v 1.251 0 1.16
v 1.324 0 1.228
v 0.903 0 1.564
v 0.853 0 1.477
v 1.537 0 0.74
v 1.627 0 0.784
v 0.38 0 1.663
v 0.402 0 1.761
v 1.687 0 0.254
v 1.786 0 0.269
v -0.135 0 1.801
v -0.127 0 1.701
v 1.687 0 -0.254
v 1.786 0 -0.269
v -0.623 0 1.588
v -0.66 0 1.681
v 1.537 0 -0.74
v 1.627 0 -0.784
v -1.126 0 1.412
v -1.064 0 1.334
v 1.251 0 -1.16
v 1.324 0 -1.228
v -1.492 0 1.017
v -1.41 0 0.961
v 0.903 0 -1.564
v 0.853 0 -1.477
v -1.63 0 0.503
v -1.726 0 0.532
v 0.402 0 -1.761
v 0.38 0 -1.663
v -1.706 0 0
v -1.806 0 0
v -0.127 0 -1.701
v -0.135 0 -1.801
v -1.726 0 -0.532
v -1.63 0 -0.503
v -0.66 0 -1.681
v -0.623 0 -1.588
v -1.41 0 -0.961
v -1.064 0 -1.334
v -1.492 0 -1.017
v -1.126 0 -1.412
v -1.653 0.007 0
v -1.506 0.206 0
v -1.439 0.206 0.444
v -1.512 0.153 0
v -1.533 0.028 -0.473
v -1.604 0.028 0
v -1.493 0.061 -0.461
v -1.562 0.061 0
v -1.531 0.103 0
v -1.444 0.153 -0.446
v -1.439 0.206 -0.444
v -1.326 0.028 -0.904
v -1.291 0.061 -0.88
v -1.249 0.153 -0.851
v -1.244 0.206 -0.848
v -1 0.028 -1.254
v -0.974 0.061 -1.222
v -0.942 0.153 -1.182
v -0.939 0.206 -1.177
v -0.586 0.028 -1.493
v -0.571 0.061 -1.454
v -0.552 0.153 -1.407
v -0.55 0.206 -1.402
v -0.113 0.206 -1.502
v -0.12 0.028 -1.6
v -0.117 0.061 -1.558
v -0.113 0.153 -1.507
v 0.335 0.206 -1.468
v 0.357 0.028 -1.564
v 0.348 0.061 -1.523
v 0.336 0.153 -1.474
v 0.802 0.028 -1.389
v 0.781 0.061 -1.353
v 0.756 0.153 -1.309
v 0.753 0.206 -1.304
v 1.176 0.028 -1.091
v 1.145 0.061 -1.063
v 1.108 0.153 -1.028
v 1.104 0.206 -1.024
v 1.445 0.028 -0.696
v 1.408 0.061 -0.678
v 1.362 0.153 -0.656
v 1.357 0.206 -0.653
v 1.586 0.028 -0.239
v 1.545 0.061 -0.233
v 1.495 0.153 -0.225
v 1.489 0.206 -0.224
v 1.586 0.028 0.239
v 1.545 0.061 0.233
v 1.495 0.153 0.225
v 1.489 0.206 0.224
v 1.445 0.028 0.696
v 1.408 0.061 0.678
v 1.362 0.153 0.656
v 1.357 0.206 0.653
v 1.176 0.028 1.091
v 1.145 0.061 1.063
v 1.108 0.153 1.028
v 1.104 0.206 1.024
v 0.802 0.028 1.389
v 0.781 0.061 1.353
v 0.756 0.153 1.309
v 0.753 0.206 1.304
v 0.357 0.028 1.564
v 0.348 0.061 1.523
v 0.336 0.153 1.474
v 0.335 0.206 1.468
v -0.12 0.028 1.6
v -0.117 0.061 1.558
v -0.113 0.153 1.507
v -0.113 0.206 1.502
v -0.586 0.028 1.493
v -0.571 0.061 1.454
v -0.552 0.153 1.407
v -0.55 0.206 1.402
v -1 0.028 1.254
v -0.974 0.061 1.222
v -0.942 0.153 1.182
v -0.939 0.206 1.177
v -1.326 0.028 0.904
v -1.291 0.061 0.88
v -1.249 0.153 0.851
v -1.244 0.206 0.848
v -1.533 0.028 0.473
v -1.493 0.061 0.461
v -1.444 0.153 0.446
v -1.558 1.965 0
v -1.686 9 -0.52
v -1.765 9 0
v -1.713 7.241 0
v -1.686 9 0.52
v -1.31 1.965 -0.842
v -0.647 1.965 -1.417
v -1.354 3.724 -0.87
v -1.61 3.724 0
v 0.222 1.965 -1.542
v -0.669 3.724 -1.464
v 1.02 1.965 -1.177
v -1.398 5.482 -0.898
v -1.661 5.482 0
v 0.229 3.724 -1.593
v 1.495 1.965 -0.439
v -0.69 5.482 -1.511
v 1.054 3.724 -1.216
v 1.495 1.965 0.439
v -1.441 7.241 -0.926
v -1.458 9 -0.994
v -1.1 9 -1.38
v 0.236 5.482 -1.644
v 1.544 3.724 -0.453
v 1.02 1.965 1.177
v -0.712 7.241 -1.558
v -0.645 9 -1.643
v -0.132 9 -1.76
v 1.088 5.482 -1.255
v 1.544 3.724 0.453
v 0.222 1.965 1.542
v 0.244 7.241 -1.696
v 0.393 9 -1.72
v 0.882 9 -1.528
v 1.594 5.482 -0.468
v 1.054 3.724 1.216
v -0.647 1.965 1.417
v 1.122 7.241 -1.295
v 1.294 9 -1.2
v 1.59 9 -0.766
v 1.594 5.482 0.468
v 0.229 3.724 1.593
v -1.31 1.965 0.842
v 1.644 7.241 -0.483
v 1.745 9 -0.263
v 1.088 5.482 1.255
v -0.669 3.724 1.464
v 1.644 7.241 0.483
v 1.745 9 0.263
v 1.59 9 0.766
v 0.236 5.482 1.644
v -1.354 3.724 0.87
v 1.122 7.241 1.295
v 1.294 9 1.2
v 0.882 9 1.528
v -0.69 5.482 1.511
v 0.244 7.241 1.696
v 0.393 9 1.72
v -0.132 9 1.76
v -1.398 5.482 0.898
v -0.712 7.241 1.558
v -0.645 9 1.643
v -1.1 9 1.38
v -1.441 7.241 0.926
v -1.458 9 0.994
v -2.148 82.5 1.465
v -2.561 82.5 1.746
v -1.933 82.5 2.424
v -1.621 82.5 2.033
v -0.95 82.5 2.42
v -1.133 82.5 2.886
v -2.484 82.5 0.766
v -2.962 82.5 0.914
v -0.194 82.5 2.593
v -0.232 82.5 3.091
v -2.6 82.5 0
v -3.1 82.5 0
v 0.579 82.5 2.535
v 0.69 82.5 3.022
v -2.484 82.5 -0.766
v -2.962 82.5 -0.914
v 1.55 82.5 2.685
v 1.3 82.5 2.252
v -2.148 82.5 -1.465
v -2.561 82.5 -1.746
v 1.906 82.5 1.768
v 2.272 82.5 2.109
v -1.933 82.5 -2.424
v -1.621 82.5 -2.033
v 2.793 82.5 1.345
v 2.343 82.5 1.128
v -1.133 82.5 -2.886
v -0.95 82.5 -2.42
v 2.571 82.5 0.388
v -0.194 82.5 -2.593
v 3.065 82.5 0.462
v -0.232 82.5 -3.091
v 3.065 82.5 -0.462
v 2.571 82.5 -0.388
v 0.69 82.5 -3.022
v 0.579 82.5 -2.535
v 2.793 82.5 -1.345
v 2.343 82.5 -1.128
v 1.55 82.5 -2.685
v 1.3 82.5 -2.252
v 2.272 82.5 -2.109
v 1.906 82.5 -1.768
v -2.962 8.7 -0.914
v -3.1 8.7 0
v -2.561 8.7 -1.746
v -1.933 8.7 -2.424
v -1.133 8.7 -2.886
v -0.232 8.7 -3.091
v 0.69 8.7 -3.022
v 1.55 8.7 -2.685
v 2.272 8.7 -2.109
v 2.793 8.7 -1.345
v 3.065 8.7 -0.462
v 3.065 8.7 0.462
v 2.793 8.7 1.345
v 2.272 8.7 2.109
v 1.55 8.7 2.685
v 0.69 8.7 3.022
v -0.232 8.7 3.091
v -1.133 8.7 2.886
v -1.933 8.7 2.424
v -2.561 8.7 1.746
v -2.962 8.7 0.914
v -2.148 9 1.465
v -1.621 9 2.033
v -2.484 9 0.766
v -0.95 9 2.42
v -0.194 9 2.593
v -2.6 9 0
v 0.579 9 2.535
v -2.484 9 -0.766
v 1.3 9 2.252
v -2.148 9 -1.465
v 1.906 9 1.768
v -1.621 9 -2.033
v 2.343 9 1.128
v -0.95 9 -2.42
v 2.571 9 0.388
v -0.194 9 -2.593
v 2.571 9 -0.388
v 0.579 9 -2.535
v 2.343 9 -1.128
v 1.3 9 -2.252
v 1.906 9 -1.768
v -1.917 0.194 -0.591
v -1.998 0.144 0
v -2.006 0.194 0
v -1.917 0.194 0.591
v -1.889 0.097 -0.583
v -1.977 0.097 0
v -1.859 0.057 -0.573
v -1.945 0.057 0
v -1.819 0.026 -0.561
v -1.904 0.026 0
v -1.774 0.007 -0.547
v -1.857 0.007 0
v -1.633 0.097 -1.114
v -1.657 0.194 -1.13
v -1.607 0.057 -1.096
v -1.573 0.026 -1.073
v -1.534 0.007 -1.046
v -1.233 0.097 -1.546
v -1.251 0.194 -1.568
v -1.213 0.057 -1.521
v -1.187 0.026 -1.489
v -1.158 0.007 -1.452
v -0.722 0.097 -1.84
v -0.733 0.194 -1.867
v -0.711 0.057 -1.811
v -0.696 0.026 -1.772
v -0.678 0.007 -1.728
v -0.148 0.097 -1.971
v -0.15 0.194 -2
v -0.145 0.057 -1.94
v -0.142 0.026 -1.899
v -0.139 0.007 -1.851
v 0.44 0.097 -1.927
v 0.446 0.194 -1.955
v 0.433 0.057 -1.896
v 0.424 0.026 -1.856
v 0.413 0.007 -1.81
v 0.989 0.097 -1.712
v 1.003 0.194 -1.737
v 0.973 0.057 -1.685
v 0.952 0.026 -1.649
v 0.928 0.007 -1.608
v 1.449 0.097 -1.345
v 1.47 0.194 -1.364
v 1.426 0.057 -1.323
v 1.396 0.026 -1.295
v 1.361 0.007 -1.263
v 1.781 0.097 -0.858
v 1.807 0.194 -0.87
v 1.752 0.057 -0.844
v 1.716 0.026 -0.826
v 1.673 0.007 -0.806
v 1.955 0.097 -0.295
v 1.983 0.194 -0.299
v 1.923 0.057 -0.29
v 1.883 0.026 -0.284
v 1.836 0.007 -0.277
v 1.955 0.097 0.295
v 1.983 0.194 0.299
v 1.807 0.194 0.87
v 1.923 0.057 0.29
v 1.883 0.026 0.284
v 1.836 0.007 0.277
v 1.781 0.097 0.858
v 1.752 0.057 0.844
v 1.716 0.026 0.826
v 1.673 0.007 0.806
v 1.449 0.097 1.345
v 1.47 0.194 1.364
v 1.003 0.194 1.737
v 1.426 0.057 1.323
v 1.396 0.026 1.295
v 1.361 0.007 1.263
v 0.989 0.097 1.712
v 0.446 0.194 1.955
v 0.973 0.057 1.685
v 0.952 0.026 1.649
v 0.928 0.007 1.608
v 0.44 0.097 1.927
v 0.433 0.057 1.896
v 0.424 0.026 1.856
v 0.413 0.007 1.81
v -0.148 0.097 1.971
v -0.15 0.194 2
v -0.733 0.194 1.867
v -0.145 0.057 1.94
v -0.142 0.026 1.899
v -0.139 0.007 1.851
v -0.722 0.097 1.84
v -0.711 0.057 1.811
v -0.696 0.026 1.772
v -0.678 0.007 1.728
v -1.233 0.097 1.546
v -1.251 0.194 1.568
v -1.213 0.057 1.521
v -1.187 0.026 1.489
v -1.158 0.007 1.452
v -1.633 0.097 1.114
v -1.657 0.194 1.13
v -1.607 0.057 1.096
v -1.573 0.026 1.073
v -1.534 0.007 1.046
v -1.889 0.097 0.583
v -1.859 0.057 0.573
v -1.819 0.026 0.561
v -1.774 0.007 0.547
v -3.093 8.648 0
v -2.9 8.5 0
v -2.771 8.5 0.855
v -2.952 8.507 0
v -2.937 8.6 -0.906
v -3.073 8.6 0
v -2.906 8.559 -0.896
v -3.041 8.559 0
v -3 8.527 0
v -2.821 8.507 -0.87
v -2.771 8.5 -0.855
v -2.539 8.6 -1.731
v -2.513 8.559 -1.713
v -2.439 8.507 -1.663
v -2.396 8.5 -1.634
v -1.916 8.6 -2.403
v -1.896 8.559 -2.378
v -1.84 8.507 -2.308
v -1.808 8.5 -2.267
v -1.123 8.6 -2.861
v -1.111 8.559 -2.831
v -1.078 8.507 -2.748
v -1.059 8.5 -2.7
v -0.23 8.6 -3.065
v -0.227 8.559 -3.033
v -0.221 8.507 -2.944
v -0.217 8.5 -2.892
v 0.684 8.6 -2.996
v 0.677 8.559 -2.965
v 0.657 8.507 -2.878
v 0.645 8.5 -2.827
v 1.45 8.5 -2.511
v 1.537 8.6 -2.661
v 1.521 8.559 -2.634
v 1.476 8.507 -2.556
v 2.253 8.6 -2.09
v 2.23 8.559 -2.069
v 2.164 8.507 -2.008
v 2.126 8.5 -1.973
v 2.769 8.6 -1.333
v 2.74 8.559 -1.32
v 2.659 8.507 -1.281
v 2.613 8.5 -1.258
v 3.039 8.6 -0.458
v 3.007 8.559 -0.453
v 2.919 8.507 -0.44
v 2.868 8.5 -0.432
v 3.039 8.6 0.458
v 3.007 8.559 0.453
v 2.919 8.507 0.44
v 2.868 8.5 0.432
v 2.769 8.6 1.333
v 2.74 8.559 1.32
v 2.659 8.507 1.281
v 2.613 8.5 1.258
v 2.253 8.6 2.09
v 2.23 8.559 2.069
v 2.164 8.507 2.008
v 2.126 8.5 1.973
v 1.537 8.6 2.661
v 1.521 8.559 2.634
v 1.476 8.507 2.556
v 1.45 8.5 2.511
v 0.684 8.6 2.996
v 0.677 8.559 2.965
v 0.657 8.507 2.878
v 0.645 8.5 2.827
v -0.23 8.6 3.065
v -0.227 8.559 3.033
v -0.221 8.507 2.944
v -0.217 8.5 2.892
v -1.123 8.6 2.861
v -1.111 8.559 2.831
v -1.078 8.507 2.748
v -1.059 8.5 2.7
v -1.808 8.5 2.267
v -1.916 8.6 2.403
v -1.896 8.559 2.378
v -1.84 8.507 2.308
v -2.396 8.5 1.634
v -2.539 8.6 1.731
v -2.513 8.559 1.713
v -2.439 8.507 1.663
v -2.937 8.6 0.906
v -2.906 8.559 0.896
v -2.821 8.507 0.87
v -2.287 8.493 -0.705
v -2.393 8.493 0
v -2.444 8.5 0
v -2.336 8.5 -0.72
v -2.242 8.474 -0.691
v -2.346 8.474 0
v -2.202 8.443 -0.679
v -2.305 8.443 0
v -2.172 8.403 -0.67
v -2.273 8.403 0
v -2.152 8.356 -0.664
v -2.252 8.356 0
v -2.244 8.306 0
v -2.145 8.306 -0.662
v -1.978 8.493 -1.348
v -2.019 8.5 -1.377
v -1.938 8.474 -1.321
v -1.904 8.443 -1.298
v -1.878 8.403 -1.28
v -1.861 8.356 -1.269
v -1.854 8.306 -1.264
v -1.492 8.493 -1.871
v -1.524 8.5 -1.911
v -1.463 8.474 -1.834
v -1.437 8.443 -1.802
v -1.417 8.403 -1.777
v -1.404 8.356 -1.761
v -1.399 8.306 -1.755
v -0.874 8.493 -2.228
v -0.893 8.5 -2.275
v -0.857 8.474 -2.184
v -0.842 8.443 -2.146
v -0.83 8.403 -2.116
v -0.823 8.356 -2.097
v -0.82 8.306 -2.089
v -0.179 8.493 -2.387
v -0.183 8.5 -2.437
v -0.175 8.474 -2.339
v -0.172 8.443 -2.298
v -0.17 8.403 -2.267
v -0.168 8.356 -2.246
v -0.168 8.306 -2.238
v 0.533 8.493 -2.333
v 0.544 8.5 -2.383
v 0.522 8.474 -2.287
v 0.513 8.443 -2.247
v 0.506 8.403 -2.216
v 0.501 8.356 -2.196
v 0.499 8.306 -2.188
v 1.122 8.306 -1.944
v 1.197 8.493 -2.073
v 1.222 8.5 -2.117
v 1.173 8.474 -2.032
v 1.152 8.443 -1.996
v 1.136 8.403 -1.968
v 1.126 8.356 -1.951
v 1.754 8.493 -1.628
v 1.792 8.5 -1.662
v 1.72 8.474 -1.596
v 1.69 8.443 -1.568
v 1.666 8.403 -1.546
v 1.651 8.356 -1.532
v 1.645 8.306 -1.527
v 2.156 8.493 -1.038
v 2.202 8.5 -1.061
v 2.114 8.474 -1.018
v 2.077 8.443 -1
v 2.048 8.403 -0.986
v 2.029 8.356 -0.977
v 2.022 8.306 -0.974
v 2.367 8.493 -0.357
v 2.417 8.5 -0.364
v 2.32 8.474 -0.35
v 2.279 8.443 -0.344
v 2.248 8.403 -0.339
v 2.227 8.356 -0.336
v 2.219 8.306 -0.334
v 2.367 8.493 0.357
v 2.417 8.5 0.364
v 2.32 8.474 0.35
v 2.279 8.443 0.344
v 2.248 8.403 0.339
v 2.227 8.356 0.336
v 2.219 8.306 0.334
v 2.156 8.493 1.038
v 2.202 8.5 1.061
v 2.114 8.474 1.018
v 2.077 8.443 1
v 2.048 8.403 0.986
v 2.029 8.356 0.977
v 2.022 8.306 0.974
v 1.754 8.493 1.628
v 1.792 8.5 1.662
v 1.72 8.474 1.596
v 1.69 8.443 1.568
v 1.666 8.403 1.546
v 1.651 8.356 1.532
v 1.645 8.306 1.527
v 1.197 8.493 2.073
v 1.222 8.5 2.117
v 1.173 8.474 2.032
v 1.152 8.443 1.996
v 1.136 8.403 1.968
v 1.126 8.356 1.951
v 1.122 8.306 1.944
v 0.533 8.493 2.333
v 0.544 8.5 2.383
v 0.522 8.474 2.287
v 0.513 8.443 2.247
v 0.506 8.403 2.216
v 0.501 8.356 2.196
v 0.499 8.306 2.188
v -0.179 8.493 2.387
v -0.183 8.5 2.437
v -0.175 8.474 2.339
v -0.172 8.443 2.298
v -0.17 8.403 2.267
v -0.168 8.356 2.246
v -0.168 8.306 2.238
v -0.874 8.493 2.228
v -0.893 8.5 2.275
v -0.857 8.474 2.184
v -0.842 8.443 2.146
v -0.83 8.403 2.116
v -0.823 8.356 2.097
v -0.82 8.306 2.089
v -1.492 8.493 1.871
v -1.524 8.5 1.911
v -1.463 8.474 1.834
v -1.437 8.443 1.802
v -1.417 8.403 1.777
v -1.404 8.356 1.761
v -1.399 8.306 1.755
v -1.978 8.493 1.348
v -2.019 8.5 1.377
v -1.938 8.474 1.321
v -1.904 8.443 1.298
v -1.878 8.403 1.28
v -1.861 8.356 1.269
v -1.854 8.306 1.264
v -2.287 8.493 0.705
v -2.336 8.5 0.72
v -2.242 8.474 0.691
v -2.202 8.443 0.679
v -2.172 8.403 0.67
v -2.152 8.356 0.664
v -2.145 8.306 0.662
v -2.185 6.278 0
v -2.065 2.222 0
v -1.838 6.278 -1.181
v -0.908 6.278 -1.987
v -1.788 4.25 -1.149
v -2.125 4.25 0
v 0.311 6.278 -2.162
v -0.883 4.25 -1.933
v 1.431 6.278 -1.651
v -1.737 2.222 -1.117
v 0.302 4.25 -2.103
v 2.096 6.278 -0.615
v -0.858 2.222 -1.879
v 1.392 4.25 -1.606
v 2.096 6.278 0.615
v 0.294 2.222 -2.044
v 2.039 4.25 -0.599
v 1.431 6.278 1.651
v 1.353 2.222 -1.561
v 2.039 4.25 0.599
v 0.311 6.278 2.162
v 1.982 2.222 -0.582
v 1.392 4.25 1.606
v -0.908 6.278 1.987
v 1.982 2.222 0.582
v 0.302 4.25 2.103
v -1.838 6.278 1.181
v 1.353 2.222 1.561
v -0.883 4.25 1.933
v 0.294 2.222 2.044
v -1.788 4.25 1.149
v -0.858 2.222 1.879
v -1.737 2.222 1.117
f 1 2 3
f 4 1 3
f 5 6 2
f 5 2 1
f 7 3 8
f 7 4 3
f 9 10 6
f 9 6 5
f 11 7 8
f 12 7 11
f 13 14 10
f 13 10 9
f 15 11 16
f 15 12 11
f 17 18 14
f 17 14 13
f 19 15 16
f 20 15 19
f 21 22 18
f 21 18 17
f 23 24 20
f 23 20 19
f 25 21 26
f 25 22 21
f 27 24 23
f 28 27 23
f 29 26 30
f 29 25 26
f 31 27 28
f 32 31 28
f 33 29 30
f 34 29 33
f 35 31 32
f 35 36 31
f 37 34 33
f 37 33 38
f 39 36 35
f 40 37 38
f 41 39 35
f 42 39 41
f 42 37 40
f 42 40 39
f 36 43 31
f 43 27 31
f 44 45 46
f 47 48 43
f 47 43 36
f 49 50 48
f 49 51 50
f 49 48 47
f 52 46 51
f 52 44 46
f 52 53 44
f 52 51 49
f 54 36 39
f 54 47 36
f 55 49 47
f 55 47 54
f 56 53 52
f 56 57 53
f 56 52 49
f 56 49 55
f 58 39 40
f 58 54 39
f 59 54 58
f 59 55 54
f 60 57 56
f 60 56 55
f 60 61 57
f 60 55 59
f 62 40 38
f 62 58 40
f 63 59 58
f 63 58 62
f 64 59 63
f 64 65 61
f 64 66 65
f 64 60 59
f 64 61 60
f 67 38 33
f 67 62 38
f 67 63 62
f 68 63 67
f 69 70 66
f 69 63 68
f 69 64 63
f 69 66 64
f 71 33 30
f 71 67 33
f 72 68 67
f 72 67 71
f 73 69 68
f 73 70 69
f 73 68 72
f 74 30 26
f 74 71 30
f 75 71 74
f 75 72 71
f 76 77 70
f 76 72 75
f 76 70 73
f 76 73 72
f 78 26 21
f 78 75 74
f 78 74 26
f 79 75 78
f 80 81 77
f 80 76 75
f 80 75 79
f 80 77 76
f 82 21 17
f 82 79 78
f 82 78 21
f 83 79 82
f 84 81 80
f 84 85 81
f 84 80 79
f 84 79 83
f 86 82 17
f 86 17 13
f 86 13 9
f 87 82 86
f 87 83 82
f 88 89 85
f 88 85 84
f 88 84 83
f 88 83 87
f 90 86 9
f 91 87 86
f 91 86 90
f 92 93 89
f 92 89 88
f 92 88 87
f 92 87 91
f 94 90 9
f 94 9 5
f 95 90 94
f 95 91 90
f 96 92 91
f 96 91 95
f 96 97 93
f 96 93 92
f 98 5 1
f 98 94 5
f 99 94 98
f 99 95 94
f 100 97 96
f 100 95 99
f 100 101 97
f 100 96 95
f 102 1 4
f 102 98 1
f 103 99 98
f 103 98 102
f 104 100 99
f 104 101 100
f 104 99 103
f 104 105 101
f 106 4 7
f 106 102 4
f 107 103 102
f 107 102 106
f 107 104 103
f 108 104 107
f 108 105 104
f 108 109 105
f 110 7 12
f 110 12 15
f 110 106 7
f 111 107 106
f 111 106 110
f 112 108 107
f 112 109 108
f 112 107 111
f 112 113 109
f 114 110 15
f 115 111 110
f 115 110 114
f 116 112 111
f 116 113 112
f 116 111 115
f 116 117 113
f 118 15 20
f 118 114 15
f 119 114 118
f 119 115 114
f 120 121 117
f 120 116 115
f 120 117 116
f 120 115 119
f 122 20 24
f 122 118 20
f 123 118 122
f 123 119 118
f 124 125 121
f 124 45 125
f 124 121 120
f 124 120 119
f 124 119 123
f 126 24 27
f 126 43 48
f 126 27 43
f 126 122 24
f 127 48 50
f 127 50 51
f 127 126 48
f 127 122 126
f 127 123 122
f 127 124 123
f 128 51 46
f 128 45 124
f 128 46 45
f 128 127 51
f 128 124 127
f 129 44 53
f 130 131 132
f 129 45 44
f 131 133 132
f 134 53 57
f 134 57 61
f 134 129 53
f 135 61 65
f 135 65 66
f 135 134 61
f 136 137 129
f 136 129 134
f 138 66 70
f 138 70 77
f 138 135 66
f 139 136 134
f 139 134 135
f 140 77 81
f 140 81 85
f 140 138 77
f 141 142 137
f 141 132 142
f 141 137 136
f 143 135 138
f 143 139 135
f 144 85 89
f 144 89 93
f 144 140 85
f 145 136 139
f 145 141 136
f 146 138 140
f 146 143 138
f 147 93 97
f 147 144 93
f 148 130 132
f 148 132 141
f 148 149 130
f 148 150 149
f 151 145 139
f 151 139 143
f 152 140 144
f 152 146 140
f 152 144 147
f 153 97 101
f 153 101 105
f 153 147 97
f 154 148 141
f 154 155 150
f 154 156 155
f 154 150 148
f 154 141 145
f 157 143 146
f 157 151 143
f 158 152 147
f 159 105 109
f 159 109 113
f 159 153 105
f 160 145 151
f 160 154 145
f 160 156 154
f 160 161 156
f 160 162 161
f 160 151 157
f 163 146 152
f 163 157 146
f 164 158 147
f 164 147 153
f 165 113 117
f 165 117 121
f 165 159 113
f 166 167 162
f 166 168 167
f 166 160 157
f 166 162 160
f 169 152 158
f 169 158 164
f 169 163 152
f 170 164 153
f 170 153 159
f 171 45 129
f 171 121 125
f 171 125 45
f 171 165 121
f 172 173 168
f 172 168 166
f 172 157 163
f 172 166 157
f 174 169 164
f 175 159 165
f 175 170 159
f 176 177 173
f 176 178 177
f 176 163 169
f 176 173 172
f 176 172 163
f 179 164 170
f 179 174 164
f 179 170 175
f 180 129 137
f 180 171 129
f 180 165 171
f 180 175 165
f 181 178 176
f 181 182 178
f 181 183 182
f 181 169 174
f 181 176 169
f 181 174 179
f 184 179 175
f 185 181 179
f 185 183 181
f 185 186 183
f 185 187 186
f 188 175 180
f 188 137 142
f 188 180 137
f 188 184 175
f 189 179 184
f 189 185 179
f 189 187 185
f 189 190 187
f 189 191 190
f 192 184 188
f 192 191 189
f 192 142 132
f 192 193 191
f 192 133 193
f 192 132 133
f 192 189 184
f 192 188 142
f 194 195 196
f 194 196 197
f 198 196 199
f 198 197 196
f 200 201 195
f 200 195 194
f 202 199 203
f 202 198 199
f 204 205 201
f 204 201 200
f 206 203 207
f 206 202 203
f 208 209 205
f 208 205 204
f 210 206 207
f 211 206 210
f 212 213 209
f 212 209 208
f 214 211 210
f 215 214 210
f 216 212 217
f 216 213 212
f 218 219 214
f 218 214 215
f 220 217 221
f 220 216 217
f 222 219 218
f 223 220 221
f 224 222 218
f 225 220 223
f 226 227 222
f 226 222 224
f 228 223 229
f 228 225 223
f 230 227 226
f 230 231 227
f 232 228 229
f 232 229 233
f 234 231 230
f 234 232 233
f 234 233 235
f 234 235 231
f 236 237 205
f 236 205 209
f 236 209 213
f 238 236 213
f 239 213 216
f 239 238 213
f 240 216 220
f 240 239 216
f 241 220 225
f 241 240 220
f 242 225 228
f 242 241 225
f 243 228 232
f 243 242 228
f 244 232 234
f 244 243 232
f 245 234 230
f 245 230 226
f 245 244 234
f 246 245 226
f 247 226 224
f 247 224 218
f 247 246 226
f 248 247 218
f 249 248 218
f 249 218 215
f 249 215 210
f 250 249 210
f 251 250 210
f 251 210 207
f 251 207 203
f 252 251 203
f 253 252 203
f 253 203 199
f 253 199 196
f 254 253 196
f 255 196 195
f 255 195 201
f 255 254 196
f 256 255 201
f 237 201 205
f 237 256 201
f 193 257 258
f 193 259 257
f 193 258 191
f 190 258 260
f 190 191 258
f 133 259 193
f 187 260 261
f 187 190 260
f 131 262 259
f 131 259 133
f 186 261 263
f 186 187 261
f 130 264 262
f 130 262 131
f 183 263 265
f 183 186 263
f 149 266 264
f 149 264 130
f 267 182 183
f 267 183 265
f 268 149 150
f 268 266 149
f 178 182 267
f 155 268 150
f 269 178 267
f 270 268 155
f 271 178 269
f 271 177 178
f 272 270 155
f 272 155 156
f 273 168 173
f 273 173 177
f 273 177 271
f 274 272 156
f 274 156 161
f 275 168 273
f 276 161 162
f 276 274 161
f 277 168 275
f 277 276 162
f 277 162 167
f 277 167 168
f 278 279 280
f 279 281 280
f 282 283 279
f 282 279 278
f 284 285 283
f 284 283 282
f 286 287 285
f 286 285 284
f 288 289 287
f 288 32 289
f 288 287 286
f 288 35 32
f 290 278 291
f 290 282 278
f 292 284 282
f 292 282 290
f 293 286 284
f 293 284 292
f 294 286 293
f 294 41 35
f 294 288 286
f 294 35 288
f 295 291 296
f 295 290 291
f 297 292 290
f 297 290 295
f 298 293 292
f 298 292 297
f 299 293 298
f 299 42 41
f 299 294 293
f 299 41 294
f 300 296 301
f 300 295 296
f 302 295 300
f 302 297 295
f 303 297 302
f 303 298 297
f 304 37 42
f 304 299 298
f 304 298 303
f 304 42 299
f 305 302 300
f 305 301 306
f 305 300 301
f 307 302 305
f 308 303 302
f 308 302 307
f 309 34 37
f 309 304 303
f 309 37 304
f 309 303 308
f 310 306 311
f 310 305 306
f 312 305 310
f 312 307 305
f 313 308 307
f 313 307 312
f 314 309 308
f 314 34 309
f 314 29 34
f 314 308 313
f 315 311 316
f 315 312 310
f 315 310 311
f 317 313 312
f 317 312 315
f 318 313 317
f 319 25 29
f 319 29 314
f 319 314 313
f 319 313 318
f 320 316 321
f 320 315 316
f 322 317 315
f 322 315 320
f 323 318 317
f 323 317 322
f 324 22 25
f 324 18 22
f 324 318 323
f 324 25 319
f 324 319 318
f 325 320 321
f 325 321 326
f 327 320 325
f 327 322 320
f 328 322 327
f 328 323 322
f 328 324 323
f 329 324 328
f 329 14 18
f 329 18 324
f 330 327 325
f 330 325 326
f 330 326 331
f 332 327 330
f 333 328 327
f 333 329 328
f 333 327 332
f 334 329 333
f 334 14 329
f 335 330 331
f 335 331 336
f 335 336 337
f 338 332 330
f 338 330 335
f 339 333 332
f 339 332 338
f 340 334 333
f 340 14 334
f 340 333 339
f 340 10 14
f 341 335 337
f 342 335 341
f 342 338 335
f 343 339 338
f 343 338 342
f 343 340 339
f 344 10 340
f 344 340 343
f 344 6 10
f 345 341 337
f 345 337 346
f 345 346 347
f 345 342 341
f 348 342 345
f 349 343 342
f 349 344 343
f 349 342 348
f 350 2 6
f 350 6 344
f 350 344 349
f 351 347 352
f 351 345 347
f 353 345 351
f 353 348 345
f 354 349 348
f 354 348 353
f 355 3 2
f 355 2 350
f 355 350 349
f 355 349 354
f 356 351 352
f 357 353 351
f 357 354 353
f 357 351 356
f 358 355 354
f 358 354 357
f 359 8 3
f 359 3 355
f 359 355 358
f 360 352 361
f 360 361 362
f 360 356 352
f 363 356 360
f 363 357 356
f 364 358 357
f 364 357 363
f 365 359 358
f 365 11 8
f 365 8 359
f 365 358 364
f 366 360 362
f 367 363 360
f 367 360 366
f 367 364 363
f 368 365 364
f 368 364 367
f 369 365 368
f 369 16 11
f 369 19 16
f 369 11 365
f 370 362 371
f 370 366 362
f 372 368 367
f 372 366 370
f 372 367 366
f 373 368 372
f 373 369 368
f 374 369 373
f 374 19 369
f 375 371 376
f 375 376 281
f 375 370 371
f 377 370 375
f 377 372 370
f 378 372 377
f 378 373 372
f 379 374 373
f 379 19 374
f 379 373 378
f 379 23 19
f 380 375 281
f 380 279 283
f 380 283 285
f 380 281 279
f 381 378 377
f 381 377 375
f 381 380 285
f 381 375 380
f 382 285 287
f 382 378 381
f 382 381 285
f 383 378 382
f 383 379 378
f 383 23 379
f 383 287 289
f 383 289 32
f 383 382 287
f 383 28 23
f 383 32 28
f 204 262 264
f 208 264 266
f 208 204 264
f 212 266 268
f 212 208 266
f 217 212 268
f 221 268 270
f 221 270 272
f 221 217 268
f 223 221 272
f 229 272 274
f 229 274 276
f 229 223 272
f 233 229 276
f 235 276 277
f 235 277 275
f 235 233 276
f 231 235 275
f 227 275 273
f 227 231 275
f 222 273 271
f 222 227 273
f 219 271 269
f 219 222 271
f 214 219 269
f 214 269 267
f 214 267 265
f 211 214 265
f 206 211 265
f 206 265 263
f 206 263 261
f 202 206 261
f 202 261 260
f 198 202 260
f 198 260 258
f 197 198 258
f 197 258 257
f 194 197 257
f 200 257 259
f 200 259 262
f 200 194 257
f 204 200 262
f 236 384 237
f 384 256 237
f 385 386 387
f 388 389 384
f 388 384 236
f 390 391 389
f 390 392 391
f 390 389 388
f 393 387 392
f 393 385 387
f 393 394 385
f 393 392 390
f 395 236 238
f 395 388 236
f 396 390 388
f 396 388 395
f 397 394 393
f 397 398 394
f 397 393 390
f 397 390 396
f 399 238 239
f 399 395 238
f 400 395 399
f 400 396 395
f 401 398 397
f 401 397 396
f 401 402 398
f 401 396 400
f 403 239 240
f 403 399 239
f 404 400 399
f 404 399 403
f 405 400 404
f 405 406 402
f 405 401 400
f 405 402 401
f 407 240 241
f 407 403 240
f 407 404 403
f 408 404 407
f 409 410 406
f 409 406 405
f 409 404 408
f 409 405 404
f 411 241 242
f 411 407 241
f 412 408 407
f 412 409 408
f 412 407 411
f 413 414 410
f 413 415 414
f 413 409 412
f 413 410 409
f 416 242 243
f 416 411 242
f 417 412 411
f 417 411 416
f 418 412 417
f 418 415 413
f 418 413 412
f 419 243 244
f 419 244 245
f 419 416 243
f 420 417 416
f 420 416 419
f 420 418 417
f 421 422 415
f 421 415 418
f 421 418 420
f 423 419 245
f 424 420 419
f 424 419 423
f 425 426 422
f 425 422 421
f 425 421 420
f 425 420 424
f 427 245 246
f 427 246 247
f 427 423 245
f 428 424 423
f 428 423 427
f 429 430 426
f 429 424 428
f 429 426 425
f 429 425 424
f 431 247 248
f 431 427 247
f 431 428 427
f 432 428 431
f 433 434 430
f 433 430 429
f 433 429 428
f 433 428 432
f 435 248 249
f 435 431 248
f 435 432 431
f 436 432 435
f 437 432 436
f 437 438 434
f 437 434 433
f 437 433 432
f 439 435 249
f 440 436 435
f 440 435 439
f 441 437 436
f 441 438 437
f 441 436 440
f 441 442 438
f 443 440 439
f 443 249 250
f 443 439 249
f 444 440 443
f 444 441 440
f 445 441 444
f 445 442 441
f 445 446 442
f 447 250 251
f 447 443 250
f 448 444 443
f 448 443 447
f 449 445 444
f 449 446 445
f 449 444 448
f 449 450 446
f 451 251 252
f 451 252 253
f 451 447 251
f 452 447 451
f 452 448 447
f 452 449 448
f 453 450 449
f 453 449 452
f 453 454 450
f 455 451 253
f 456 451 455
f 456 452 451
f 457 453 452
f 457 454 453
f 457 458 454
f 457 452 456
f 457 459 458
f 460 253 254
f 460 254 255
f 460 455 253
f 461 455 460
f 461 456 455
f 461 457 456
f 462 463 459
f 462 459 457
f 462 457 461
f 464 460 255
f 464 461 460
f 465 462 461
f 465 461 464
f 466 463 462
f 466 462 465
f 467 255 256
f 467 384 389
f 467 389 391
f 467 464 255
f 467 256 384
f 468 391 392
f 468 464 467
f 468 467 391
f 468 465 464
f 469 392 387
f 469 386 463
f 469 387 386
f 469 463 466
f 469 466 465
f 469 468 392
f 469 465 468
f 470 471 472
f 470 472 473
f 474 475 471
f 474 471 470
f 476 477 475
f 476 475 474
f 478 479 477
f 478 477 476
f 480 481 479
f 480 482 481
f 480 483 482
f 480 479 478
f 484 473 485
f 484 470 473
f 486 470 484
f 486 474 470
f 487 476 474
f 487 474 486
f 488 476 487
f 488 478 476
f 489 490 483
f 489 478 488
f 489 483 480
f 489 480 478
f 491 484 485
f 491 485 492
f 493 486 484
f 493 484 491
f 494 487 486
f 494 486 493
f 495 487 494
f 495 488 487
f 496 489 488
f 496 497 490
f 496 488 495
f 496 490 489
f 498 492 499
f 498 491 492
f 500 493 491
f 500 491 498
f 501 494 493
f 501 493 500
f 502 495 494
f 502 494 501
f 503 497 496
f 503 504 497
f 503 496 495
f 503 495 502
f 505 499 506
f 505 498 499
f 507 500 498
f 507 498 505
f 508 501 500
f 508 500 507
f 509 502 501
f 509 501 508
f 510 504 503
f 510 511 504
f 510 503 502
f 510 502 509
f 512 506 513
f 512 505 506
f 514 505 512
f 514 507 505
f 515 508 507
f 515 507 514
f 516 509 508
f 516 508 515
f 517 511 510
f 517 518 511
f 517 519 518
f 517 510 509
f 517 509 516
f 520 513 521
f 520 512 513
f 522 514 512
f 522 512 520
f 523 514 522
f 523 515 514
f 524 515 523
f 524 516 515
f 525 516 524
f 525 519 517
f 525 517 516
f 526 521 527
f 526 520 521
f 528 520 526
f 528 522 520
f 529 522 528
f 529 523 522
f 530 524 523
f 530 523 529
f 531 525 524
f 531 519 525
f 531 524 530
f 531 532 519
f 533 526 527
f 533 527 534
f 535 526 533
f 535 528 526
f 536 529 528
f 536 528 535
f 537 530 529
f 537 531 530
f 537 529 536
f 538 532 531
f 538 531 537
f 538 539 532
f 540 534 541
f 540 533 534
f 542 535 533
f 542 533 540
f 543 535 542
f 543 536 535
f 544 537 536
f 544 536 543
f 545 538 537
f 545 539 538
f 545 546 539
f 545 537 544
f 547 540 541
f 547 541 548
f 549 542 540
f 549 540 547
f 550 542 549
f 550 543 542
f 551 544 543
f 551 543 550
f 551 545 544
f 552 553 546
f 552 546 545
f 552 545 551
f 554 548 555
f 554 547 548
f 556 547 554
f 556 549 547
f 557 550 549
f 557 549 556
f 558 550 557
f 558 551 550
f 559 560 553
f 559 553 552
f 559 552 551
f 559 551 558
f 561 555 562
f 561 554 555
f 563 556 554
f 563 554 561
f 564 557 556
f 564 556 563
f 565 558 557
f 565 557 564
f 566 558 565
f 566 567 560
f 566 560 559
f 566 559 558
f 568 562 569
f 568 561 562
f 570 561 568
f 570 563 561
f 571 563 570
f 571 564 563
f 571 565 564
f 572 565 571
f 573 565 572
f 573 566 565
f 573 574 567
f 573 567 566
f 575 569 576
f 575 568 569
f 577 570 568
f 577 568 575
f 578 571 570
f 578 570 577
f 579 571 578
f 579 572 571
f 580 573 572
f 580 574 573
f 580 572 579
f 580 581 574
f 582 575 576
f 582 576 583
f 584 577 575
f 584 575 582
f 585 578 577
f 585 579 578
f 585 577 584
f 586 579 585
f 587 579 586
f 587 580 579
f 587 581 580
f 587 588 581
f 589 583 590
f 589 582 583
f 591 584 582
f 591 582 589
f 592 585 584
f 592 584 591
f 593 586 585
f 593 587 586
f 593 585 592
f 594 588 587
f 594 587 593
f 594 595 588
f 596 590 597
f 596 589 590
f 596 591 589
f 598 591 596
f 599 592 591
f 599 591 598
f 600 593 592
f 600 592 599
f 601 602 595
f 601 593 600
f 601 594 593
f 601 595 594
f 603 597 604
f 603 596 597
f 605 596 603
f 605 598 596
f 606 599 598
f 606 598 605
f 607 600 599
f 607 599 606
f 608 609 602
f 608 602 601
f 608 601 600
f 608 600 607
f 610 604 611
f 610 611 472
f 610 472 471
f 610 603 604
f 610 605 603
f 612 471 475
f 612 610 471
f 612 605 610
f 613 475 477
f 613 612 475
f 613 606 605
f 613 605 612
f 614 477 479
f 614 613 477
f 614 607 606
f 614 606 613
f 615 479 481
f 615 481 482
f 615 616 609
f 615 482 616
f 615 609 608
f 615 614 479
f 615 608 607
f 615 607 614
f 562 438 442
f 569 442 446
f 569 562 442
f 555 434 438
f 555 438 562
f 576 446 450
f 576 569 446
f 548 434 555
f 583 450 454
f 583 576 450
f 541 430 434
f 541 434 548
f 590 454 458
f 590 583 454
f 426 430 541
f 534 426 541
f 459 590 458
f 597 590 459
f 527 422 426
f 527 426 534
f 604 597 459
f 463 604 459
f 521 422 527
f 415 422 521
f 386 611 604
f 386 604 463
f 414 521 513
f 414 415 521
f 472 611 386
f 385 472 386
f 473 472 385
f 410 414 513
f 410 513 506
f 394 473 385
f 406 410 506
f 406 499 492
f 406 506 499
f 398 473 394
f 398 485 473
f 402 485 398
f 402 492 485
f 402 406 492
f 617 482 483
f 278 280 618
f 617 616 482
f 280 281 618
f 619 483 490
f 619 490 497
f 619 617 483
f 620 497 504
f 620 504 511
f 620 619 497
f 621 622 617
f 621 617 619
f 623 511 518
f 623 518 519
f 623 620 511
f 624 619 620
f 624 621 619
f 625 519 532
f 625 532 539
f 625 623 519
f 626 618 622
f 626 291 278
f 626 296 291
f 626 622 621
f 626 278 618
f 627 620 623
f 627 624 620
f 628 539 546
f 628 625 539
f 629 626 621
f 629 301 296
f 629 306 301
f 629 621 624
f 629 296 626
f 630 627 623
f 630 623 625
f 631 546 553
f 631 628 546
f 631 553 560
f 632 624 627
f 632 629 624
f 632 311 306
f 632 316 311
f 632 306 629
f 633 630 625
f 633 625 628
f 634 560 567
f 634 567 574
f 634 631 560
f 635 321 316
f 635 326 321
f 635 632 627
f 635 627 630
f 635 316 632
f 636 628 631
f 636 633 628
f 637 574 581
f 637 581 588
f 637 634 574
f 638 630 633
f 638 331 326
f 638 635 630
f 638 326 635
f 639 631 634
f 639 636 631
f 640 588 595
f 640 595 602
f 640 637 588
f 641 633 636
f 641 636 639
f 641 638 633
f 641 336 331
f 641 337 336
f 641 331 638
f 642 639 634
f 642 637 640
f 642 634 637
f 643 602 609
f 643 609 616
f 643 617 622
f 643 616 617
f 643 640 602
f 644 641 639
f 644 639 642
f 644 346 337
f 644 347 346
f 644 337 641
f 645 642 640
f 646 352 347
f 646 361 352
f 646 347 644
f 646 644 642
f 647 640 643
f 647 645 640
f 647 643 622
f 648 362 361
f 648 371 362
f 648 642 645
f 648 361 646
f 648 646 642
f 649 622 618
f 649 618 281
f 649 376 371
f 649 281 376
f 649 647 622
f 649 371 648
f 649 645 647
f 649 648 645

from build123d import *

# Parameters (mm, degrees)
VERRUNDUNG1_R = 0.2


with BuildPart() as part:
    # Skizze1 → Rotation1 (revolve)
    with BuildSketch(Plane.XY):
        Polygon((-2.6, 82.5), (-3.1, 82.5), (-3.1, 8.5), (-2.25, 8.5), (-2, 0), (-1.5, 0), (-1.764705882, 9), (-2.6, 9), align=None)
    revolve(axis=Axis((0, 0, 0), (0, -1, 0)))

    # Verrundung1
    verrundung1_edges = [part.edges().sort_by_distance(p)[0] for p in [
        (1.5, 0, 0),
        (2, 0, 0),
        (2.25, 8.5, 0),
        (3.1, 8.5, 0),
    ]]
    fillet(verrundung1_edges, radius=VERRUNDUNG1_R)


solid = part.part
